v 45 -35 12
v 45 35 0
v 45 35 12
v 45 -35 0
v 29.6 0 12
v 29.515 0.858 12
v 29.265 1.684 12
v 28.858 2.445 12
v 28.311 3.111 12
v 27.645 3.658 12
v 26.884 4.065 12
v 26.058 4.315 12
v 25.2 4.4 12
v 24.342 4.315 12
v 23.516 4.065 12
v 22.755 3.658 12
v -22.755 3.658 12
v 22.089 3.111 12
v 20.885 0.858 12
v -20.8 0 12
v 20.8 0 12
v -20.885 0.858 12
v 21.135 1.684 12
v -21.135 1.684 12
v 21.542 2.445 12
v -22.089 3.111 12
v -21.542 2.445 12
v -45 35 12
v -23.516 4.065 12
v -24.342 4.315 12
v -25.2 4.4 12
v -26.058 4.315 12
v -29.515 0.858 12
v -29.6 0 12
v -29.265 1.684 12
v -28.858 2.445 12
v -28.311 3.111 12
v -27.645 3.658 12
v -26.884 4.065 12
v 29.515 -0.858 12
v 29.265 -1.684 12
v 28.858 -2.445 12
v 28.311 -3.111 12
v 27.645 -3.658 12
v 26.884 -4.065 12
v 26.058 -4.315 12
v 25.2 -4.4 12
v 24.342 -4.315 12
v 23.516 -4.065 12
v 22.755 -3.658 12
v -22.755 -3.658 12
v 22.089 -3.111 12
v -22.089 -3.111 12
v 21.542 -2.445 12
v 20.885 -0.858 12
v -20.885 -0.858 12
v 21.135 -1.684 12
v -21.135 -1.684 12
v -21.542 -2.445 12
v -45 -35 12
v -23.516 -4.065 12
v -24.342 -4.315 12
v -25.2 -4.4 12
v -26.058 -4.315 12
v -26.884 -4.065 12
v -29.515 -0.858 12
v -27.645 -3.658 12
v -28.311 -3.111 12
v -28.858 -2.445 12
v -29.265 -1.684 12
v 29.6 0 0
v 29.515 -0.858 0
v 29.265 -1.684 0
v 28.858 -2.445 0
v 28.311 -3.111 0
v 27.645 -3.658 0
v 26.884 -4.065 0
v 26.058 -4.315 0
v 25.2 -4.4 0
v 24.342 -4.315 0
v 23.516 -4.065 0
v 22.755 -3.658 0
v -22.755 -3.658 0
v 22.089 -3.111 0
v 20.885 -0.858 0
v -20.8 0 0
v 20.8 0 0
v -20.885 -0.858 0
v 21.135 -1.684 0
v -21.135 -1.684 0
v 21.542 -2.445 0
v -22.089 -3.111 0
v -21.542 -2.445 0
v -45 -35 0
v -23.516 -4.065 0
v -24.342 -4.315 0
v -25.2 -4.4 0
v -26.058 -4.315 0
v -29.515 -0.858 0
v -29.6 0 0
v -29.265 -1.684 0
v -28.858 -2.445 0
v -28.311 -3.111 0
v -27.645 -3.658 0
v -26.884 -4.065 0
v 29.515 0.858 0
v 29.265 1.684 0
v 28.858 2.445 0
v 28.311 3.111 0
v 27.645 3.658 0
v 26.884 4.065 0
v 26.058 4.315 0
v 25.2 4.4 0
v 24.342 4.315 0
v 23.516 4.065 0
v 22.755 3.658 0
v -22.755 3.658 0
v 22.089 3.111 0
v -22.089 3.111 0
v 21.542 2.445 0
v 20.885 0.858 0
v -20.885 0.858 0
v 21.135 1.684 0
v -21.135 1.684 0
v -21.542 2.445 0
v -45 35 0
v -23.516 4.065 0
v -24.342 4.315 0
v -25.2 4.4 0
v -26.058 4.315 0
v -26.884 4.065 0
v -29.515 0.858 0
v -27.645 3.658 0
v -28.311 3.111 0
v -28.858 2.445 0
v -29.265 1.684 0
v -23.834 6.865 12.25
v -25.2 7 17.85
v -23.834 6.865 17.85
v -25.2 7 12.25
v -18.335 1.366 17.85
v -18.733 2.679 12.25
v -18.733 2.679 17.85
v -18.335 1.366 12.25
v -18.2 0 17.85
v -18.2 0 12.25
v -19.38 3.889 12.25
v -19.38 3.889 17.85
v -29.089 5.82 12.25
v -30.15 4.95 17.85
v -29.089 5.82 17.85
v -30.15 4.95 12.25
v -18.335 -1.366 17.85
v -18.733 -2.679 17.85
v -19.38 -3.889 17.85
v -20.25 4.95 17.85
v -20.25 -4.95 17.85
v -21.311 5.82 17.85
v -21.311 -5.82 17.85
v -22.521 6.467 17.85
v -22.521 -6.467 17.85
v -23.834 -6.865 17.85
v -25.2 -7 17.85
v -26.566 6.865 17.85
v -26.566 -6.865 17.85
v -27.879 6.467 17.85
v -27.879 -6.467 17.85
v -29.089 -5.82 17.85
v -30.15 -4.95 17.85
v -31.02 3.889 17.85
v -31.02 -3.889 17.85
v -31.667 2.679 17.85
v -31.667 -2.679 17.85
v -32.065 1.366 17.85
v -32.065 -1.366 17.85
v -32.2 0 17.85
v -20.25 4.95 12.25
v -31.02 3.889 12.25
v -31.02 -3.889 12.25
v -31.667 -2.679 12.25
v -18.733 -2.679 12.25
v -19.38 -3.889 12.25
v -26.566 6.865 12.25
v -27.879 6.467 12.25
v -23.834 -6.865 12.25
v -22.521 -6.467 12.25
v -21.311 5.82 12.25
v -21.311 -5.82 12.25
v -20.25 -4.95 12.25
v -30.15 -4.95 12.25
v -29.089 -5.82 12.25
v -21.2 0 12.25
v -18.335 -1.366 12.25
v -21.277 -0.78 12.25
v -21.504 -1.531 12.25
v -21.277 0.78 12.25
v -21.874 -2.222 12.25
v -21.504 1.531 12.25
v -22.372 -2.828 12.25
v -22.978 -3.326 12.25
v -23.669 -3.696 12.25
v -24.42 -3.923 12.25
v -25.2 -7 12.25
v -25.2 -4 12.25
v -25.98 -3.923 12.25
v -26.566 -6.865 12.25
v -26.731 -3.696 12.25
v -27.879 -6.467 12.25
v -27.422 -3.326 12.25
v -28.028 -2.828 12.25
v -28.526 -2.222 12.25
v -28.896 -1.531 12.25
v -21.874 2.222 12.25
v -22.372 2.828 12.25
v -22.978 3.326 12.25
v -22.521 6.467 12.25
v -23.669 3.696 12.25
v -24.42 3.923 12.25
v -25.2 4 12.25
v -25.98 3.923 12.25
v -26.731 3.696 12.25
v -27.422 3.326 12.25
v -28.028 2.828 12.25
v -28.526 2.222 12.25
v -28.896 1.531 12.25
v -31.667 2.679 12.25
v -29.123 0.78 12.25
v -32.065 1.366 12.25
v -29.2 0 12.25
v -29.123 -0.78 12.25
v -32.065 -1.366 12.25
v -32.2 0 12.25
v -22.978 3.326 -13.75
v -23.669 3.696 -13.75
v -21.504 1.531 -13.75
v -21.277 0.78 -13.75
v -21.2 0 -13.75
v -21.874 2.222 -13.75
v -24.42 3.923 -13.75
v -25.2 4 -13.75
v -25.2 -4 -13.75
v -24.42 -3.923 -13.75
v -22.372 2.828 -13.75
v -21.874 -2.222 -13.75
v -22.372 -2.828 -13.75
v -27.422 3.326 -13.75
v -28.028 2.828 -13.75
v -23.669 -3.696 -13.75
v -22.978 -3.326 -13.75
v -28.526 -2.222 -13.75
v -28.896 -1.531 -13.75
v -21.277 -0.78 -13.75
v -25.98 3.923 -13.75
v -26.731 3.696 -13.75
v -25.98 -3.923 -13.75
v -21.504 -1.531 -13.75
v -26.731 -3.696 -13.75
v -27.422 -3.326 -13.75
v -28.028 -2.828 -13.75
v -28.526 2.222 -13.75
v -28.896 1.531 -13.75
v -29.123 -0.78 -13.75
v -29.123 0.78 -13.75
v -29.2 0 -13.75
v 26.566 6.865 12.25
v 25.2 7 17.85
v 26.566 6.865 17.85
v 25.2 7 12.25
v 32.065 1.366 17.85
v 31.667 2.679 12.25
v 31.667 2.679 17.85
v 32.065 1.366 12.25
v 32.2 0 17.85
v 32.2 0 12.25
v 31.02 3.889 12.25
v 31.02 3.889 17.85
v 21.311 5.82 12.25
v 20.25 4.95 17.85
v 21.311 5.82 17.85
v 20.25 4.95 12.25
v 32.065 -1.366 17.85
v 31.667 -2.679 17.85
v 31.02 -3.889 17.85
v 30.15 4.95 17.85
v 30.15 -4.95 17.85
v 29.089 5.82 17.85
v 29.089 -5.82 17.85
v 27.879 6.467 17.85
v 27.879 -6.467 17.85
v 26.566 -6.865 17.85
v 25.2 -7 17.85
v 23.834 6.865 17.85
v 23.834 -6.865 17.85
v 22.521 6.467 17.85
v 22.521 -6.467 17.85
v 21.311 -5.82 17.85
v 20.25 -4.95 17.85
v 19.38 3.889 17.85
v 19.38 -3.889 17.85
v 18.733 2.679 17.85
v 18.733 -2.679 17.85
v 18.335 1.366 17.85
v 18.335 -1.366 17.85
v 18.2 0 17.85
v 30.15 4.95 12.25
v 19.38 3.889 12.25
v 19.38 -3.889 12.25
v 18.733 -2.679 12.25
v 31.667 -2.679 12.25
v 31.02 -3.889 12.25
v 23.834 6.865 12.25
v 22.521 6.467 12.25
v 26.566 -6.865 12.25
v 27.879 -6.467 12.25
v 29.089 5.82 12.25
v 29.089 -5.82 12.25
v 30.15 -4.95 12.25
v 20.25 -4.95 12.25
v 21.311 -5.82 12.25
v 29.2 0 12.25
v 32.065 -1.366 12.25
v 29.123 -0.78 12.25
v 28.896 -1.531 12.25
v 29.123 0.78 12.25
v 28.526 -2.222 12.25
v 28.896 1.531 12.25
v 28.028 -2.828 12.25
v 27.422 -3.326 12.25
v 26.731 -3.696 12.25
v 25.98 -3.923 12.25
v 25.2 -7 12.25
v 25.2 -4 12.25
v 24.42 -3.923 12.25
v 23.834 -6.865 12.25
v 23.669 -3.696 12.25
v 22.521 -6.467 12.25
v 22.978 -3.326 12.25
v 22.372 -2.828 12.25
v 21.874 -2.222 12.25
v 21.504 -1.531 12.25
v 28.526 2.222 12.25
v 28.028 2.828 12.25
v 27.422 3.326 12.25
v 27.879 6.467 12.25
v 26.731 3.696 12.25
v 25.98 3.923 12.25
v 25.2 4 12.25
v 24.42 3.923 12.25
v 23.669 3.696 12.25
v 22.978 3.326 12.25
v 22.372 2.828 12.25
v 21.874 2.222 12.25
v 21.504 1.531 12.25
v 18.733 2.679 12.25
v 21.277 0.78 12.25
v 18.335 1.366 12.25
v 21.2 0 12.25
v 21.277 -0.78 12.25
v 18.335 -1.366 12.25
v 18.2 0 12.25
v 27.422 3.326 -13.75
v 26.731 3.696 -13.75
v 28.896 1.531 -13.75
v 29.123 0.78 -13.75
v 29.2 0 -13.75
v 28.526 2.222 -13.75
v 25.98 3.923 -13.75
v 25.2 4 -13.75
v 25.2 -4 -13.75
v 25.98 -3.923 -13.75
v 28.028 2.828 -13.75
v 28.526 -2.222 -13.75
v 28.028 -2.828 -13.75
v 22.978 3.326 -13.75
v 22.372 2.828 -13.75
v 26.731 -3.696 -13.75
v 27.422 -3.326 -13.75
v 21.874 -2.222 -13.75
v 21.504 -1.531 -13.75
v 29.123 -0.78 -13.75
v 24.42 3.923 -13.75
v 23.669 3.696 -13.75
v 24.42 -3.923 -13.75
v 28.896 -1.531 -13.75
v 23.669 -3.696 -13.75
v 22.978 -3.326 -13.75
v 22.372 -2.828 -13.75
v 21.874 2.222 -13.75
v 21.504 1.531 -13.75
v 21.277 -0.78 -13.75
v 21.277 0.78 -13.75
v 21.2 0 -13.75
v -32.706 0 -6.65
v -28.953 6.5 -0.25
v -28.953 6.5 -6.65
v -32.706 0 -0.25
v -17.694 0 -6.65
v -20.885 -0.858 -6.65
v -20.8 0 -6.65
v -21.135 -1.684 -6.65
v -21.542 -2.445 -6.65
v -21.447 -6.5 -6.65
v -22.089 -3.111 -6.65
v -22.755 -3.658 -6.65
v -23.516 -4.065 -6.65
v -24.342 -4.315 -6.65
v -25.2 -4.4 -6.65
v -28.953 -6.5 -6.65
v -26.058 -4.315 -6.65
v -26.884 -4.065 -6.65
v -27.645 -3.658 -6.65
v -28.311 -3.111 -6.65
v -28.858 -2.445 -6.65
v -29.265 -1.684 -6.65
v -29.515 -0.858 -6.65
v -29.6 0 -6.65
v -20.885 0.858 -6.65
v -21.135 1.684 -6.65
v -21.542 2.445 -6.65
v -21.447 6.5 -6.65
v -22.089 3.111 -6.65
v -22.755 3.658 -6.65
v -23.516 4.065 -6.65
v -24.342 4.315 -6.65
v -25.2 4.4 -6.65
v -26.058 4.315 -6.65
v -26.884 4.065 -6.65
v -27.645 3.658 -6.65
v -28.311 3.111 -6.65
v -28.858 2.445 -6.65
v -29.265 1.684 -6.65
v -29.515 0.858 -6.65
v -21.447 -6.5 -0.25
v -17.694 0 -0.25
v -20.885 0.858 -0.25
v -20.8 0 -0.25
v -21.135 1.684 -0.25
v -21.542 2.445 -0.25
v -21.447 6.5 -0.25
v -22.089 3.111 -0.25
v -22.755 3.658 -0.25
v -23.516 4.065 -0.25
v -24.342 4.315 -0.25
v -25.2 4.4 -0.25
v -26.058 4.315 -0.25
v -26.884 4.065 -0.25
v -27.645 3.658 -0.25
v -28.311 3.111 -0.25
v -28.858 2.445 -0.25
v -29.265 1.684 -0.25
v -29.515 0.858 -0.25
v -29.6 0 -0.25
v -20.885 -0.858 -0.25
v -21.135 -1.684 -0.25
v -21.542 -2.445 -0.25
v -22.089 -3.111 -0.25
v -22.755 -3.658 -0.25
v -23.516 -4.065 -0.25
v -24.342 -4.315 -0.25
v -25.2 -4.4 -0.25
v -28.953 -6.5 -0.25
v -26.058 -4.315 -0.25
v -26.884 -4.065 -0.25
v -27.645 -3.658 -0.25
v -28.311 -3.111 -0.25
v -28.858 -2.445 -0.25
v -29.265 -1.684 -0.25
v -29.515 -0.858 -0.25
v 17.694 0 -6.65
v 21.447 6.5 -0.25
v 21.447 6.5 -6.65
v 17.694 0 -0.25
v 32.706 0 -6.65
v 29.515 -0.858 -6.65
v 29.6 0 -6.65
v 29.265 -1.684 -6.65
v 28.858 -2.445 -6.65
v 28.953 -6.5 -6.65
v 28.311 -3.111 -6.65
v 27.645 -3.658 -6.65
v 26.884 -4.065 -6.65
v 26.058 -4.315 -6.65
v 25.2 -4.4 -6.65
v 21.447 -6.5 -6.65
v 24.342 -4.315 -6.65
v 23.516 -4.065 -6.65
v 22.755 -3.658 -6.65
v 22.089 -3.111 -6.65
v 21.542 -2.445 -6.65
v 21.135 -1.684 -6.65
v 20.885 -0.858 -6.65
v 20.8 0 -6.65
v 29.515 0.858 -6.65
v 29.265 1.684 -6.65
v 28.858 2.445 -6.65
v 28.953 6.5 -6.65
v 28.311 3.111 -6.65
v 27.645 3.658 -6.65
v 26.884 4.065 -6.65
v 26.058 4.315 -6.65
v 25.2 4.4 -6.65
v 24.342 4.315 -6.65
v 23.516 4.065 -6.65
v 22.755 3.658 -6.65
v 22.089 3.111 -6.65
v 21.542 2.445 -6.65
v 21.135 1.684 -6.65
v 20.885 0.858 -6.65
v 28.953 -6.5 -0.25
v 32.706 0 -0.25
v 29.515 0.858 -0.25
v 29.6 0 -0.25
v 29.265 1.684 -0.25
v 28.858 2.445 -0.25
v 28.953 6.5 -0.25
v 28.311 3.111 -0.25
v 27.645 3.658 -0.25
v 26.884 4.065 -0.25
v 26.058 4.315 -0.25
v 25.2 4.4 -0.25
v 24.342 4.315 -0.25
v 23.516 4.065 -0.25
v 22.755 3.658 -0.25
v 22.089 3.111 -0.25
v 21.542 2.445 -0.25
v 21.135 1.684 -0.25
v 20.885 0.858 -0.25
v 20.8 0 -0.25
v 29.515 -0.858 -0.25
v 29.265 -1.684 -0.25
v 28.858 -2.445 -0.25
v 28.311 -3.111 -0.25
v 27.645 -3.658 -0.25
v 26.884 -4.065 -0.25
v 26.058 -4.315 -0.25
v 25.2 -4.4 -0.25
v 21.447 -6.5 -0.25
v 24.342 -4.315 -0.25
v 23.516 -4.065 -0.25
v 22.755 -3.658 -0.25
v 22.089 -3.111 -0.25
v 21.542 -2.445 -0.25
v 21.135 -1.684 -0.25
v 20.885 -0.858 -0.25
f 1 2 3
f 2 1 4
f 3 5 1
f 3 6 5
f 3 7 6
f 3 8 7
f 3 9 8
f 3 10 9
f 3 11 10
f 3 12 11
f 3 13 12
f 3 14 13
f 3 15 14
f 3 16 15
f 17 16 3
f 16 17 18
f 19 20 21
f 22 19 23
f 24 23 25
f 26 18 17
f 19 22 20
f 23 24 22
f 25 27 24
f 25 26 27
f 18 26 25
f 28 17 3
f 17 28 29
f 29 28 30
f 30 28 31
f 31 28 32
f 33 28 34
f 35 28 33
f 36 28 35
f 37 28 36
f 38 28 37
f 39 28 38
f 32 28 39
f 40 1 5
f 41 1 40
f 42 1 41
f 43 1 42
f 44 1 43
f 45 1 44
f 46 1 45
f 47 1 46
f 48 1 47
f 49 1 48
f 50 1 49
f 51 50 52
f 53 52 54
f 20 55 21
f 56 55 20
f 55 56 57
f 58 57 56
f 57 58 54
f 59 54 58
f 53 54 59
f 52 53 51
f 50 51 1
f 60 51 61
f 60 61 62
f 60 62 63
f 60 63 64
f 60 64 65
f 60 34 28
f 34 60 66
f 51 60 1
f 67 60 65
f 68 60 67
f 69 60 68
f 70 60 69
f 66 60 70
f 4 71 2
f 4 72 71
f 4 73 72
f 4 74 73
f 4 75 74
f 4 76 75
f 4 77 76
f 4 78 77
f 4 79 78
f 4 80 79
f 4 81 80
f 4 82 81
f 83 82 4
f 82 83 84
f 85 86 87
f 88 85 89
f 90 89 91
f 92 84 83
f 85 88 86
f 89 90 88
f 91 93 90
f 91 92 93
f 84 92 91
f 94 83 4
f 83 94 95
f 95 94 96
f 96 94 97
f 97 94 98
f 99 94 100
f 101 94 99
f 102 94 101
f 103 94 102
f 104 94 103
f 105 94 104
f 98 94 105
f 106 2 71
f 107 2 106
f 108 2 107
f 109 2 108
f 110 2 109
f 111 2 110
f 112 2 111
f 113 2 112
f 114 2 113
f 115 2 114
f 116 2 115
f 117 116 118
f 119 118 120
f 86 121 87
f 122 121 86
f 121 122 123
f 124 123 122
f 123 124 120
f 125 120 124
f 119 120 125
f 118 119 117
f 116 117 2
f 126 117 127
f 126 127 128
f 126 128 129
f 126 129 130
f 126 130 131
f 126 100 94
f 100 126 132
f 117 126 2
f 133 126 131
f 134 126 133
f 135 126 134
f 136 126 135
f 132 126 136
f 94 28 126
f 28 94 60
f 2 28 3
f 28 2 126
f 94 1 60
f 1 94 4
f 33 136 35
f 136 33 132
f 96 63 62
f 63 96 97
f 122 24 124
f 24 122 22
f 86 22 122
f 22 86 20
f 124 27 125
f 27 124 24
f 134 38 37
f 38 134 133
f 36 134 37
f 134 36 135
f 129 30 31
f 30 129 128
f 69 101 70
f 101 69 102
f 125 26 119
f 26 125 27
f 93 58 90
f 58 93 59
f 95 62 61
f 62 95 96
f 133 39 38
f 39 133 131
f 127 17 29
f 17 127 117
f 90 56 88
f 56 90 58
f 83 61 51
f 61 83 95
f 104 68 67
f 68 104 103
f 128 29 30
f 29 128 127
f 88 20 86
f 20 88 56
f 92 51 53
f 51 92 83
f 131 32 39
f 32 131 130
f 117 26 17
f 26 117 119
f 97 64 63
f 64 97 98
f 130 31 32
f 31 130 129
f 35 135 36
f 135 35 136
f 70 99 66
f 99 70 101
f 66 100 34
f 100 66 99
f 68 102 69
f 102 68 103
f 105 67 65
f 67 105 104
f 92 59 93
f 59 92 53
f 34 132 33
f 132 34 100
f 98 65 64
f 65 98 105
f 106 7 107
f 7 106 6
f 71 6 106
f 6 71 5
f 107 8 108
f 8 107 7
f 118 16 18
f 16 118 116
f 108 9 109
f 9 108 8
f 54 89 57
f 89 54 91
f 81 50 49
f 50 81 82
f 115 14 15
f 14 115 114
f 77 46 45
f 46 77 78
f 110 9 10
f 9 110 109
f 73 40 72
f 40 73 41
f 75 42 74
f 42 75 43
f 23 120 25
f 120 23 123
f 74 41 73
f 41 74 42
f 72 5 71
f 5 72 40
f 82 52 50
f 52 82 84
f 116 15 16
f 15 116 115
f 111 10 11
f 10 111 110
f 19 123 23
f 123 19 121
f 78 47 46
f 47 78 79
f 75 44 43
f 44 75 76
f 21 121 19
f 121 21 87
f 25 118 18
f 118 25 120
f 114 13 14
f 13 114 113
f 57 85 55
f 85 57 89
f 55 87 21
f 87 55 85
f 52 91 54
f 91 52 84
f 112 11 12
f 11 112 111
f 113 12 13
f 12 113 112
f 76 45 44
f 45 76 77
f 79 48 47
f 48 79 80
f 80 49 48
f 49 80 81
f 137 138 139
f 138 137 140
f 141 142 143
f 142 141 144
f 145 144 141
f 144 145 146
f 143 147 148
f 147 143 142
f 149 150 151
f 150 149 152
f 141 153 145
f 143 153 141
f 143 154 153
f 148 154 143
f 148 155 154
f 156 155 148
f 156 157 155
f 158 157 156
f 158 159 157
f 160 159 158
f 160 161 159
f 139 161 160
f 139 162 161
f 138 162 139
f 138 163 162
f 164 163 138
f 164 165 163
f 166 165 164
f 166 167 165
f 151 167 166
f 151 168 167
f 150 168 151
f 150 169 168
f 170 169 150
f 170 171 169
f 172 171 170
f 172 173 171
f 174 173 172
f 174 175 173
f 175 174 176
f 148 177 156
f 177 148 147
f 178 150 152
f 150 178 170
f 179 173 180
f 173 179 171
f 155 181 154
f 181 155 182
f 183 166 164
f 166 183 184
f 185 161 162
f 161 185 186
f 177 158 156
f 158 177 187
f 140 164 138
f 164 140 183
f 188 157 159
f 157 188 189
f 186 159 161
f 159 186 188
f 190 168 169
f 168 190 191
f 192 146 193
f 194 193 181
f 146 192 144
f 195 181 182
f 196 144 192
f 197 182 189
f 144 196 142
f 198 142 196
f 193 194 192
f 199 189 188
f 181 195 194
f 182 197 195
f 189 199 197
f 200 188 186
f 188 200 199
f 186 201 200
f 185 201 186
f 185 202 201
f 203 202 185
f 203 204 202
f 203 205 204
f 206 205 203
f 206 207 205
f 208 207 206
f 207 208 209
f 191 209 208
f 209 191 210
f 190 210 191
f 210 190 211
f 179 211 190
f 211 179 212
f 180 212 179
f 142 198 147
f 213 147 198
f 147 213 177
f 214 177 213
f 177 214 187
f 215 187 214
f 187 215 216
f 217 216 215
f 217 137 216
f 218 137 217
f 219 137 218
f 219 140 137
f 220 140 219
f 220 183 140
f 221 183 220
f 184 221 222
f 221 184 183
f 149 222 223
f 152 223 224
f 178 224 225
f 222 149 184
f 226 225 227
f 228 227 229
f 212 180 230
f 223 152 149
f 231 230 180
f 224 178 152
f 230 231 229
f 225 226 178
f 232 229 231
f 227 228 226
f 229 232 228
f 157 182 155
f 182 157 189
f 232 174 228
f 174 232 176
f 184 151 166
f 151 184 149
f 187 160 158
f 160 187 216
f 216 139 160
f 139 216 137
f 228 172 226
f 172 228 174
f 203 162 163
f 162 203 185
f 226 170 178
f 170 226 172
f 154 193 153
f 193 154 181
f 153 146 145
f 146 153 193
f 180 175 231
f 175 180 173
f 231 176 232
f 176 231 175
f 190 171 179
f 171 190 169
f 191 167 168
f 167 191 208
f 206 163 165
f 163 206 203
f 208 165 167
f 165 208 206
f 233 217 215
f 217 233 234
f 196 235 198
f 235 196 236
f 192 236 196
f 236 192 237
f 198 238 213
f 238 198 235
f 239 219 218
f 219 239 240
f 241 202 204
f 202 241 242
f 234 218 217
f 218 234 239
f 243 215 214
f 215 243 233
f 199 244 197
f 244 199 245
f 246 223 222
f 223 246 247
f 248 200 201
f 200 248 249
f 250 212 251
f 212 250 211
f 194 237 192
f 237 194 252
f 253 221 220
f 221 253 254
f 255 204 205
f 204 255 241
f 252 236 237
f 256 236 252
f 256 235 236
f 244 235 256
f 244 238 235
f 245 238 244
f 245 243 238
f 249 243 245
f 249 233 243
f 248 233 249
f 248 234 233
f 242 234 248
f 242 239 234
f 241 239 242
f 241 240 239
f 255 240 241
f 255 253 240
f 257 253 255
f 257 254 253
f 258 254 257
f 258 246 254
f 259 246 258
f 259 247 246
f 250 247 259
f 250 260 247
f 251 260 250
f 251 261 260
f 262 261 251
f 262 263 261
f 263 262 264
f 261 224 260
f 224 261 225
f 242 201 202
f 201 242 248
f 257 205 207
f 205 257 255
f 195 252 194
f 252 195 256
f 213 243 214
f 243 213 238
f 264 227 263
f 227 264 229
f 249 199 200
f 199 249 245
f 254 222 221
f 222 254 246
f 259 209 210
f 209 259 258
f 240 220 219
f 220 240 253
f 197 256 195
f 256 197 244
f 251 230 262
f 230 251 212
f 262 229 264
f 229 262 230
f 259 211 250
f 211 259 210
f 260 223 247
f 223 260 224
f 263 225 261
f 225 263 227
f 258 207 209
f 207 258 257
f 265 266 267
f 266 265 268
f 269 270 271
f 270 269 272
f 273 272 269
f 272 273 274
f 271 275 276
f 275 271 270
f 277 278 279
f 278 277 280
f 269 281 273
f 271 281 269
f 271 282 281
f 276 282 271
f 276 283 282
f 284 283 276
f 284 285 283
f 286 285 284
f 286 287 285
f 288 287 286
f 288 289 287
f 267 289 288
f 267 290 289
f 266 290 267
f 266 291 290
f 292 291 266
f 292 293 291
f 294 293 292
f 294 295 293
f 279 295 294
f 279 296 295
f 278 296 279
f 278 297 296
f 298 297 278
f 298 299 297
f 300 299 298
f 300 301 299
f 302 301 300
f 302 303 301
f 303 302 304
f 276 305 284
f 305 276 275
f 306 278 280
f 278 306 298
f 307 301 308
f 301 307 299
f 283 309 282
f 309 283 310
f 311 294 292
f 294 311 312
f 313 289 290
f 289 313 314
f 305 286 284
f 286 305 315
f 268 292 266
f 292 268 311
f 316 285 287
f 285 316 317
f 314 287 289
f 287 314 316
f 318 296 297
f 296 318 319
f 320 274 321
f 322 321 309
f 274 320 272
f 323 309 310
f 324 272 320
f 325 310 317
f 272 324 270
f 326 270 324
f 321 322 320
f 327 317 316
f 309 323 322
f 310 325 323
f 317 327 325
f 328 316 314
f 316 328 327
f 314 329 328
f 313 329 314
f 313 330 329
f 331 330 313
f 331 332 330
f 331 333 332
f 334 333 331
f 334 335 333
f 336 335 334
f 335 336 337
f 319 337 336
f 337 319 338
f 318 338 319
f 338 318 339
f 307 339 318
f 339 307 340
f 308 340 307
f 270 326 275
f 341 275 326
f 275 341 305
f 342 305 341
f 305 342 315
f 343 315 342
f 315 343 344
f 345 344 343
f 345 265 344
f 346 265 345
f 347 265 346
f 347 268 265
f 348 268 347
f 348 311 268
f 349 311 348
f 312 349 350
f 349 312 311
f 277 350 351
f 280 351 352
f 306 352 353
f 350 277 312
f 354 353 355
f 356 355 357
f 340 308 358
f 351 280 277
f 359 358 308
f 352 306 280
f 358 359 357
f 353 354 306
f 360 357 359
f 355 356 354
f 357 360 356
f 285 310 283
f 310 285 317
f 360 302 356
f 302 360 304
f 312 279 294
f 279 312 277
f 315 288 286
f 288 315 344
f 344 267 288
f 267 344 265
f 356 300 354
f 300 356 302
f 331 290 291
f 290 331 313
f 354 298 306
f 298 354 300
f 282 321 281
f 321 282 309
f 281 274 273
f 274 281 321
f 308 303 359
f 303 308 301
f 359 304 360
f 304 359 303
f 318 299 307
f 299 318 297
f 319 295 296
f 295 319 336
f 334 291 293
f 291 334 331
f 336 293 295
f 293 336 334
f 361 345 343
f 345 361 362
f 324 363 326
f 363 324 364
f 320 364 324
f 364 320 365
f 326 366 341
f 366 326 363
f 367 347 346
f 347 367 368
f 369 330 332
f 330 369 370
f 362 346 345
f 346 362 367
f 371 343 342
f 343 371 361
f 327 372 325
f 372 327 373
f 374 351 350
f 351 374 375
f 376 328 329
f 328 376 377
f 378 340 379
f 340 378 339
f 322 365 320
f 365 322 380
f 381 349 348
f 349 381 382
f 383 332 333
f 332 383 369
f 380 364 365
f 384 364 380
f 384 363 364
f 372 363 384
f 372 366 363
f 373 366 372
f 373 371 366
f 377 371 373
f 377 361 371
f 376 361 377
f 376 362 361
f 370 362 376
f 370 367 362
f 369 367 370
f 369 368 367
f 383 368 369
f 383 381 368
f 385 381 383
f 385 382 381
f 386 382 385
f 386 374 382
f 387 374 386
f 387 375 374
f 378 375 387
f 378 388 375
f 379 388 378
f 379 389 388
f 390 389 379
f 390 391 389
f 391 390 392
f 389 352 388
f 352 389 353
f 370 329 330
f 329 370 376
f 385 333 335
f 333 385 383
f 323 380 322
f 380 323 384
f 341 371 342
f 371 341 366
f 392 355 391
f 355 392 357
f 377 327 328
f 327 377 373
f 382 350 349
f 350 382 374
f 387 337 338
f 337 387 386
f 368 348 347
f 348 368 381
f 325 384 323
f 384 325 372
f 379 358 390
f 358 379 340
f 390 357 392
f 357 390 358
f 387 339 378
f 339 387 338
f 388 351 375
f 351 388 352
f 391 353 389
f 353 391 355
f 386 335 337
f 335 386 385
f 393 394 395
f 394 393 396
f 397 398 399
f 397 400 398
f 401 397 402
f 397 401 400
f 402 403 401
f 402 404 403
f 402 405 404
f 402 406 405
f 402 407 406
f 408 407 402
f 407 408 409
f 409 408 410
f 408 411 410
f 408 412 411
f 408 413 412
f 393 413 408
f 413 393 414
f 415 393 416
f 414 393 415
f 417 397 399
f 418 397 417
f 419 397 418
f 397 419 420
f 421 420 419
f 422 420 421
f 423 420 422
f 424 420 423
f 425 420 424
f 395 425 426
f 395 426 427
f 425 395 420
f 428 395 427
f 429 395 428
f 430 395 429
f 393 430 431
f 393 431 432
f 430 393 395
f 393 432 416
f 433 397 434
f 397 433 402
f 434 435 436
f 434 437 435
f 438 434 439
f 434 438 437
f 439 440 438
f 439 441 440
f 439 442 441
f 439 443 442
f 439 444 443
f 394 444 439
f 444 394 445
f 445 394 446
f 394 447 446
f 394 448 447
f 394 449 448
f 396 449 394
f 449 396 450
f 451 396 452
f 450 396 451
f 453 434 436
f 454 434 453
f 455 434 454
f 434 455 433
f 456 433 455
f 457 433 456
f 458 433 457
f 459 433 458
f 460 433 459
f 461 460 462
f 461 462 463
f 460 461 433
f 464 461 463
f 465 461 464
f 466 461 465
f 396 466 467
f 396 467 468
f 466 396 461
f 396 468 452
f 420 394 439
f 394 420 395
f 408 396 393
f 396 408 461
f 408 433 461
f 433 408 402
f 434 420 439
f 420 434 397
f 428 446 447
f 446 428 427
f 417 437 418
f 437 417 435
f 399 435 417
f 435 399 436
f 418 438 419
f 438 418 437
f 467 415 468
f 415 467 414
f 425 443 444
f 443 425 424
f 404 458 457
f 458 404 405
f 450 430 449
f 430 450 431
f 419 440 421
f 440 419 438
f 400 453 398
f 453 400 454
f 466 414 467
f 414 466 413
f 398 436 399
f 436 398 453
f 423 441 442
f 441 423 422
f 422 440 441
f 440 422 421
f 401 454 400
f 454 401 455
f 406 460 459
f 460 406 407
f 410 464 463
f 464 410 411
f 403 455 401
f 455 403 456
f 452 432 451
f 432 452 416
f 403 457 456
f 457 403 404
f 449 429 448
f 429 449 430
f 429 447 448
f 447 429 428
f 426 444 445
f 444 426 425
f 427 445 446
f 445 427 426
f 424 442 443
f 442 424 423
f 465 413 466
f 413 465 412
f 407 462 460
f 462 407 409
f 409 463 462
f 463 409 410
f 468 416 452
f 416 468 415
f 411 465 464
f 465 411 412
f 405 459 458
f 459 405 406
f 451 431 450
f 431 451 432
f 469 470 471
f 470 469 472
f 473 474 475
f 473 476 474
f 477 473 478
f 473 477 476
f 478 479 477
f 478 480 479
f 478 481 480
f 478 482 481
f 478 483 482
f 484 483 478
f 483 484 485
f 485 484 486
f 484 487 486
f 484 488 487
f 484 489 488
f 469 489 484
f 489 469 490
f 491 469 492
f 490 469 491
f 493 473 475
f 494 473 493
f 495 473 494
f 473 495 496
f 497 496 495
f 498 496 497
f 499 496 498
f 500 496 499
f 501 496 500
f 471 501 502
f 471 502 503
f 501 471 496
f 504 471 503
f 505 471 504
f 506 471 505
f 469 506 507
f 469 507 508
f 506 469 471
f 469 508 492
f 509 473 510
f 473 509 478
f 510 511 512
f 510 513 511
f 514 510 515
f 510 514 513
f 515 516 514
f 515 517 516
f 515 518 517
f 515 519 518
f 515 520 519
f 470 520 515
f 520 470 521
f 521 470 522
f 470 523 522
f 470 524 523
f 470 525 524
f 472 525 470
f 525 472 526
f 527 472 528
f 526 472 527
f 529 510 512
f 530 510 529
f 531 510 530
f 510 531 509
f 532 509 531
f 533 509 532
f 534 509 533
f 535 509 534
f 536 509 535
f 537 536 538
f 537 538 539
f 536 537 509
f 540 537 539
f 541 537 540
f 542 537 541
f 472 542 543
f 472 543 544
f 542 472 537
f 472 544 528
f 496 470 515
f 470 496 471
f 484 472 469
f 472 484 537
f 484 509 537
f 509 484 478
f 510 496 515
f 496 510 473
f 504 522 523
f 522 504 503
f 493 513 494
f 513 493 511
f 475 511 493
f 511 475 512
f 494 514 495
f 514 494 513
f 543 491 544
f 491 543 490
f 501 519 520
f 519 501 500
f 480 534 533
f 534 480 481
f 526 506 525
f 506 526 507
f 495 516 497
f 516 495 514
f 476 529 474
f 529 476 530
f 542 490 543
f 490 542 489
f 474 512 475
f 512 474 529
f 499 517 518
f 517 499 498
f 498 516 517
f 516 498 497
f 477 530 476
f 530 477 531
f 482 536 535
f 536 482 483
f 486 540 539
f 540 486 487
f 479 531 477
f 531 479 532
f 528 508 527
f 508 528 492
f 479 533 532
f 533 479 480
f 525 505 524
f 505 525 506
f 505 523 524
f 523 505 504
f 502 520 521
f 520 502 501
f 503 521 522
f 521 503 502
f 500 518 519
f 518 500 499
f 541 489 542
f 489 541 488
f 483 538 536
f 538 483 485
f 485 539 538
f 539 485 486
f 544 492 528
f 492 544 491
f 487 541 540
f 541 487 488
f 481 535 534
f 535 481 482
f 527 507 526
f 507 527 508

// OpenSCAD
$fn = 32;

// ------------------------------------------------------------------------
// Bolted plate: 90 x 70 x 12 mm plate, 2 fasteners
// Every part is its own module, assembly() places them once.
// ------------------------------------------------------------------------

// --- part 1 ---
module plate() {
  difference() {
    translate([-45, -35, 0]) cube([90, 70, 12]);
    translate([-25.2, 0, -1]) cylinder(h = 14, d = 8.8);
    translate([25.2, 0, -1]) cylinder(h = 14, d = 8.8);
  }
}

// --- part 2 ---
module bolt1() {
  cylinder(h = 5.6, d = 14);
  translate([0, 0, -26]) cylinder(h = 26, d = 8);
}

// --- part 3 ---
module bolt2() {
  cylinder(h = 5.6, d = 14);
  translate([0, 0, -26]) cylinder(h = 26, d = 8);
}

// --- part 4 ---
module nut1() {
  difference() {
    linear_extrude(height = 6.4) polygon(points = [[7.506, 0], [3.753, 6.5], [-3.753, 6.5], [-7.506, 0], [-3.753, -6.5], [3.753, -6.5]]);
    translate([0, 0, -1]) cylinder(h = 8.4, d = 8.8);
  }
}

// --- part 5 ---
module nut2() {
  difference() {
    linear_extrude(height = 6.4) polygon(points = [[7.506, 0], [3.753, 6.5], [-3.753, 6.5], [-7.506, 0], [-3.753, -6.5], [3.753, -6.5]]);
    translate([0, 0, -1]) cylinder(h = 8.4, d = 8.8);
  }
}

// --- assembly ---
module assembly() {
  translate([0, 0, 0]) rotate([0, 0, 0]) plate();
  translate([-25.2, 0, 12.25]) rotate([0, 0, 0]) bolt1();
  translate([25.2, 0, 12.25]) rotate([0, 0, 0]) bolt2();
  translate([-25.2, 0, -6.65]) rotate([0, 0, 0]) nut1();
  translate([25.2, 0, -6.65]) rotate([0, 0, 0]) nut2();
}

assembly();
